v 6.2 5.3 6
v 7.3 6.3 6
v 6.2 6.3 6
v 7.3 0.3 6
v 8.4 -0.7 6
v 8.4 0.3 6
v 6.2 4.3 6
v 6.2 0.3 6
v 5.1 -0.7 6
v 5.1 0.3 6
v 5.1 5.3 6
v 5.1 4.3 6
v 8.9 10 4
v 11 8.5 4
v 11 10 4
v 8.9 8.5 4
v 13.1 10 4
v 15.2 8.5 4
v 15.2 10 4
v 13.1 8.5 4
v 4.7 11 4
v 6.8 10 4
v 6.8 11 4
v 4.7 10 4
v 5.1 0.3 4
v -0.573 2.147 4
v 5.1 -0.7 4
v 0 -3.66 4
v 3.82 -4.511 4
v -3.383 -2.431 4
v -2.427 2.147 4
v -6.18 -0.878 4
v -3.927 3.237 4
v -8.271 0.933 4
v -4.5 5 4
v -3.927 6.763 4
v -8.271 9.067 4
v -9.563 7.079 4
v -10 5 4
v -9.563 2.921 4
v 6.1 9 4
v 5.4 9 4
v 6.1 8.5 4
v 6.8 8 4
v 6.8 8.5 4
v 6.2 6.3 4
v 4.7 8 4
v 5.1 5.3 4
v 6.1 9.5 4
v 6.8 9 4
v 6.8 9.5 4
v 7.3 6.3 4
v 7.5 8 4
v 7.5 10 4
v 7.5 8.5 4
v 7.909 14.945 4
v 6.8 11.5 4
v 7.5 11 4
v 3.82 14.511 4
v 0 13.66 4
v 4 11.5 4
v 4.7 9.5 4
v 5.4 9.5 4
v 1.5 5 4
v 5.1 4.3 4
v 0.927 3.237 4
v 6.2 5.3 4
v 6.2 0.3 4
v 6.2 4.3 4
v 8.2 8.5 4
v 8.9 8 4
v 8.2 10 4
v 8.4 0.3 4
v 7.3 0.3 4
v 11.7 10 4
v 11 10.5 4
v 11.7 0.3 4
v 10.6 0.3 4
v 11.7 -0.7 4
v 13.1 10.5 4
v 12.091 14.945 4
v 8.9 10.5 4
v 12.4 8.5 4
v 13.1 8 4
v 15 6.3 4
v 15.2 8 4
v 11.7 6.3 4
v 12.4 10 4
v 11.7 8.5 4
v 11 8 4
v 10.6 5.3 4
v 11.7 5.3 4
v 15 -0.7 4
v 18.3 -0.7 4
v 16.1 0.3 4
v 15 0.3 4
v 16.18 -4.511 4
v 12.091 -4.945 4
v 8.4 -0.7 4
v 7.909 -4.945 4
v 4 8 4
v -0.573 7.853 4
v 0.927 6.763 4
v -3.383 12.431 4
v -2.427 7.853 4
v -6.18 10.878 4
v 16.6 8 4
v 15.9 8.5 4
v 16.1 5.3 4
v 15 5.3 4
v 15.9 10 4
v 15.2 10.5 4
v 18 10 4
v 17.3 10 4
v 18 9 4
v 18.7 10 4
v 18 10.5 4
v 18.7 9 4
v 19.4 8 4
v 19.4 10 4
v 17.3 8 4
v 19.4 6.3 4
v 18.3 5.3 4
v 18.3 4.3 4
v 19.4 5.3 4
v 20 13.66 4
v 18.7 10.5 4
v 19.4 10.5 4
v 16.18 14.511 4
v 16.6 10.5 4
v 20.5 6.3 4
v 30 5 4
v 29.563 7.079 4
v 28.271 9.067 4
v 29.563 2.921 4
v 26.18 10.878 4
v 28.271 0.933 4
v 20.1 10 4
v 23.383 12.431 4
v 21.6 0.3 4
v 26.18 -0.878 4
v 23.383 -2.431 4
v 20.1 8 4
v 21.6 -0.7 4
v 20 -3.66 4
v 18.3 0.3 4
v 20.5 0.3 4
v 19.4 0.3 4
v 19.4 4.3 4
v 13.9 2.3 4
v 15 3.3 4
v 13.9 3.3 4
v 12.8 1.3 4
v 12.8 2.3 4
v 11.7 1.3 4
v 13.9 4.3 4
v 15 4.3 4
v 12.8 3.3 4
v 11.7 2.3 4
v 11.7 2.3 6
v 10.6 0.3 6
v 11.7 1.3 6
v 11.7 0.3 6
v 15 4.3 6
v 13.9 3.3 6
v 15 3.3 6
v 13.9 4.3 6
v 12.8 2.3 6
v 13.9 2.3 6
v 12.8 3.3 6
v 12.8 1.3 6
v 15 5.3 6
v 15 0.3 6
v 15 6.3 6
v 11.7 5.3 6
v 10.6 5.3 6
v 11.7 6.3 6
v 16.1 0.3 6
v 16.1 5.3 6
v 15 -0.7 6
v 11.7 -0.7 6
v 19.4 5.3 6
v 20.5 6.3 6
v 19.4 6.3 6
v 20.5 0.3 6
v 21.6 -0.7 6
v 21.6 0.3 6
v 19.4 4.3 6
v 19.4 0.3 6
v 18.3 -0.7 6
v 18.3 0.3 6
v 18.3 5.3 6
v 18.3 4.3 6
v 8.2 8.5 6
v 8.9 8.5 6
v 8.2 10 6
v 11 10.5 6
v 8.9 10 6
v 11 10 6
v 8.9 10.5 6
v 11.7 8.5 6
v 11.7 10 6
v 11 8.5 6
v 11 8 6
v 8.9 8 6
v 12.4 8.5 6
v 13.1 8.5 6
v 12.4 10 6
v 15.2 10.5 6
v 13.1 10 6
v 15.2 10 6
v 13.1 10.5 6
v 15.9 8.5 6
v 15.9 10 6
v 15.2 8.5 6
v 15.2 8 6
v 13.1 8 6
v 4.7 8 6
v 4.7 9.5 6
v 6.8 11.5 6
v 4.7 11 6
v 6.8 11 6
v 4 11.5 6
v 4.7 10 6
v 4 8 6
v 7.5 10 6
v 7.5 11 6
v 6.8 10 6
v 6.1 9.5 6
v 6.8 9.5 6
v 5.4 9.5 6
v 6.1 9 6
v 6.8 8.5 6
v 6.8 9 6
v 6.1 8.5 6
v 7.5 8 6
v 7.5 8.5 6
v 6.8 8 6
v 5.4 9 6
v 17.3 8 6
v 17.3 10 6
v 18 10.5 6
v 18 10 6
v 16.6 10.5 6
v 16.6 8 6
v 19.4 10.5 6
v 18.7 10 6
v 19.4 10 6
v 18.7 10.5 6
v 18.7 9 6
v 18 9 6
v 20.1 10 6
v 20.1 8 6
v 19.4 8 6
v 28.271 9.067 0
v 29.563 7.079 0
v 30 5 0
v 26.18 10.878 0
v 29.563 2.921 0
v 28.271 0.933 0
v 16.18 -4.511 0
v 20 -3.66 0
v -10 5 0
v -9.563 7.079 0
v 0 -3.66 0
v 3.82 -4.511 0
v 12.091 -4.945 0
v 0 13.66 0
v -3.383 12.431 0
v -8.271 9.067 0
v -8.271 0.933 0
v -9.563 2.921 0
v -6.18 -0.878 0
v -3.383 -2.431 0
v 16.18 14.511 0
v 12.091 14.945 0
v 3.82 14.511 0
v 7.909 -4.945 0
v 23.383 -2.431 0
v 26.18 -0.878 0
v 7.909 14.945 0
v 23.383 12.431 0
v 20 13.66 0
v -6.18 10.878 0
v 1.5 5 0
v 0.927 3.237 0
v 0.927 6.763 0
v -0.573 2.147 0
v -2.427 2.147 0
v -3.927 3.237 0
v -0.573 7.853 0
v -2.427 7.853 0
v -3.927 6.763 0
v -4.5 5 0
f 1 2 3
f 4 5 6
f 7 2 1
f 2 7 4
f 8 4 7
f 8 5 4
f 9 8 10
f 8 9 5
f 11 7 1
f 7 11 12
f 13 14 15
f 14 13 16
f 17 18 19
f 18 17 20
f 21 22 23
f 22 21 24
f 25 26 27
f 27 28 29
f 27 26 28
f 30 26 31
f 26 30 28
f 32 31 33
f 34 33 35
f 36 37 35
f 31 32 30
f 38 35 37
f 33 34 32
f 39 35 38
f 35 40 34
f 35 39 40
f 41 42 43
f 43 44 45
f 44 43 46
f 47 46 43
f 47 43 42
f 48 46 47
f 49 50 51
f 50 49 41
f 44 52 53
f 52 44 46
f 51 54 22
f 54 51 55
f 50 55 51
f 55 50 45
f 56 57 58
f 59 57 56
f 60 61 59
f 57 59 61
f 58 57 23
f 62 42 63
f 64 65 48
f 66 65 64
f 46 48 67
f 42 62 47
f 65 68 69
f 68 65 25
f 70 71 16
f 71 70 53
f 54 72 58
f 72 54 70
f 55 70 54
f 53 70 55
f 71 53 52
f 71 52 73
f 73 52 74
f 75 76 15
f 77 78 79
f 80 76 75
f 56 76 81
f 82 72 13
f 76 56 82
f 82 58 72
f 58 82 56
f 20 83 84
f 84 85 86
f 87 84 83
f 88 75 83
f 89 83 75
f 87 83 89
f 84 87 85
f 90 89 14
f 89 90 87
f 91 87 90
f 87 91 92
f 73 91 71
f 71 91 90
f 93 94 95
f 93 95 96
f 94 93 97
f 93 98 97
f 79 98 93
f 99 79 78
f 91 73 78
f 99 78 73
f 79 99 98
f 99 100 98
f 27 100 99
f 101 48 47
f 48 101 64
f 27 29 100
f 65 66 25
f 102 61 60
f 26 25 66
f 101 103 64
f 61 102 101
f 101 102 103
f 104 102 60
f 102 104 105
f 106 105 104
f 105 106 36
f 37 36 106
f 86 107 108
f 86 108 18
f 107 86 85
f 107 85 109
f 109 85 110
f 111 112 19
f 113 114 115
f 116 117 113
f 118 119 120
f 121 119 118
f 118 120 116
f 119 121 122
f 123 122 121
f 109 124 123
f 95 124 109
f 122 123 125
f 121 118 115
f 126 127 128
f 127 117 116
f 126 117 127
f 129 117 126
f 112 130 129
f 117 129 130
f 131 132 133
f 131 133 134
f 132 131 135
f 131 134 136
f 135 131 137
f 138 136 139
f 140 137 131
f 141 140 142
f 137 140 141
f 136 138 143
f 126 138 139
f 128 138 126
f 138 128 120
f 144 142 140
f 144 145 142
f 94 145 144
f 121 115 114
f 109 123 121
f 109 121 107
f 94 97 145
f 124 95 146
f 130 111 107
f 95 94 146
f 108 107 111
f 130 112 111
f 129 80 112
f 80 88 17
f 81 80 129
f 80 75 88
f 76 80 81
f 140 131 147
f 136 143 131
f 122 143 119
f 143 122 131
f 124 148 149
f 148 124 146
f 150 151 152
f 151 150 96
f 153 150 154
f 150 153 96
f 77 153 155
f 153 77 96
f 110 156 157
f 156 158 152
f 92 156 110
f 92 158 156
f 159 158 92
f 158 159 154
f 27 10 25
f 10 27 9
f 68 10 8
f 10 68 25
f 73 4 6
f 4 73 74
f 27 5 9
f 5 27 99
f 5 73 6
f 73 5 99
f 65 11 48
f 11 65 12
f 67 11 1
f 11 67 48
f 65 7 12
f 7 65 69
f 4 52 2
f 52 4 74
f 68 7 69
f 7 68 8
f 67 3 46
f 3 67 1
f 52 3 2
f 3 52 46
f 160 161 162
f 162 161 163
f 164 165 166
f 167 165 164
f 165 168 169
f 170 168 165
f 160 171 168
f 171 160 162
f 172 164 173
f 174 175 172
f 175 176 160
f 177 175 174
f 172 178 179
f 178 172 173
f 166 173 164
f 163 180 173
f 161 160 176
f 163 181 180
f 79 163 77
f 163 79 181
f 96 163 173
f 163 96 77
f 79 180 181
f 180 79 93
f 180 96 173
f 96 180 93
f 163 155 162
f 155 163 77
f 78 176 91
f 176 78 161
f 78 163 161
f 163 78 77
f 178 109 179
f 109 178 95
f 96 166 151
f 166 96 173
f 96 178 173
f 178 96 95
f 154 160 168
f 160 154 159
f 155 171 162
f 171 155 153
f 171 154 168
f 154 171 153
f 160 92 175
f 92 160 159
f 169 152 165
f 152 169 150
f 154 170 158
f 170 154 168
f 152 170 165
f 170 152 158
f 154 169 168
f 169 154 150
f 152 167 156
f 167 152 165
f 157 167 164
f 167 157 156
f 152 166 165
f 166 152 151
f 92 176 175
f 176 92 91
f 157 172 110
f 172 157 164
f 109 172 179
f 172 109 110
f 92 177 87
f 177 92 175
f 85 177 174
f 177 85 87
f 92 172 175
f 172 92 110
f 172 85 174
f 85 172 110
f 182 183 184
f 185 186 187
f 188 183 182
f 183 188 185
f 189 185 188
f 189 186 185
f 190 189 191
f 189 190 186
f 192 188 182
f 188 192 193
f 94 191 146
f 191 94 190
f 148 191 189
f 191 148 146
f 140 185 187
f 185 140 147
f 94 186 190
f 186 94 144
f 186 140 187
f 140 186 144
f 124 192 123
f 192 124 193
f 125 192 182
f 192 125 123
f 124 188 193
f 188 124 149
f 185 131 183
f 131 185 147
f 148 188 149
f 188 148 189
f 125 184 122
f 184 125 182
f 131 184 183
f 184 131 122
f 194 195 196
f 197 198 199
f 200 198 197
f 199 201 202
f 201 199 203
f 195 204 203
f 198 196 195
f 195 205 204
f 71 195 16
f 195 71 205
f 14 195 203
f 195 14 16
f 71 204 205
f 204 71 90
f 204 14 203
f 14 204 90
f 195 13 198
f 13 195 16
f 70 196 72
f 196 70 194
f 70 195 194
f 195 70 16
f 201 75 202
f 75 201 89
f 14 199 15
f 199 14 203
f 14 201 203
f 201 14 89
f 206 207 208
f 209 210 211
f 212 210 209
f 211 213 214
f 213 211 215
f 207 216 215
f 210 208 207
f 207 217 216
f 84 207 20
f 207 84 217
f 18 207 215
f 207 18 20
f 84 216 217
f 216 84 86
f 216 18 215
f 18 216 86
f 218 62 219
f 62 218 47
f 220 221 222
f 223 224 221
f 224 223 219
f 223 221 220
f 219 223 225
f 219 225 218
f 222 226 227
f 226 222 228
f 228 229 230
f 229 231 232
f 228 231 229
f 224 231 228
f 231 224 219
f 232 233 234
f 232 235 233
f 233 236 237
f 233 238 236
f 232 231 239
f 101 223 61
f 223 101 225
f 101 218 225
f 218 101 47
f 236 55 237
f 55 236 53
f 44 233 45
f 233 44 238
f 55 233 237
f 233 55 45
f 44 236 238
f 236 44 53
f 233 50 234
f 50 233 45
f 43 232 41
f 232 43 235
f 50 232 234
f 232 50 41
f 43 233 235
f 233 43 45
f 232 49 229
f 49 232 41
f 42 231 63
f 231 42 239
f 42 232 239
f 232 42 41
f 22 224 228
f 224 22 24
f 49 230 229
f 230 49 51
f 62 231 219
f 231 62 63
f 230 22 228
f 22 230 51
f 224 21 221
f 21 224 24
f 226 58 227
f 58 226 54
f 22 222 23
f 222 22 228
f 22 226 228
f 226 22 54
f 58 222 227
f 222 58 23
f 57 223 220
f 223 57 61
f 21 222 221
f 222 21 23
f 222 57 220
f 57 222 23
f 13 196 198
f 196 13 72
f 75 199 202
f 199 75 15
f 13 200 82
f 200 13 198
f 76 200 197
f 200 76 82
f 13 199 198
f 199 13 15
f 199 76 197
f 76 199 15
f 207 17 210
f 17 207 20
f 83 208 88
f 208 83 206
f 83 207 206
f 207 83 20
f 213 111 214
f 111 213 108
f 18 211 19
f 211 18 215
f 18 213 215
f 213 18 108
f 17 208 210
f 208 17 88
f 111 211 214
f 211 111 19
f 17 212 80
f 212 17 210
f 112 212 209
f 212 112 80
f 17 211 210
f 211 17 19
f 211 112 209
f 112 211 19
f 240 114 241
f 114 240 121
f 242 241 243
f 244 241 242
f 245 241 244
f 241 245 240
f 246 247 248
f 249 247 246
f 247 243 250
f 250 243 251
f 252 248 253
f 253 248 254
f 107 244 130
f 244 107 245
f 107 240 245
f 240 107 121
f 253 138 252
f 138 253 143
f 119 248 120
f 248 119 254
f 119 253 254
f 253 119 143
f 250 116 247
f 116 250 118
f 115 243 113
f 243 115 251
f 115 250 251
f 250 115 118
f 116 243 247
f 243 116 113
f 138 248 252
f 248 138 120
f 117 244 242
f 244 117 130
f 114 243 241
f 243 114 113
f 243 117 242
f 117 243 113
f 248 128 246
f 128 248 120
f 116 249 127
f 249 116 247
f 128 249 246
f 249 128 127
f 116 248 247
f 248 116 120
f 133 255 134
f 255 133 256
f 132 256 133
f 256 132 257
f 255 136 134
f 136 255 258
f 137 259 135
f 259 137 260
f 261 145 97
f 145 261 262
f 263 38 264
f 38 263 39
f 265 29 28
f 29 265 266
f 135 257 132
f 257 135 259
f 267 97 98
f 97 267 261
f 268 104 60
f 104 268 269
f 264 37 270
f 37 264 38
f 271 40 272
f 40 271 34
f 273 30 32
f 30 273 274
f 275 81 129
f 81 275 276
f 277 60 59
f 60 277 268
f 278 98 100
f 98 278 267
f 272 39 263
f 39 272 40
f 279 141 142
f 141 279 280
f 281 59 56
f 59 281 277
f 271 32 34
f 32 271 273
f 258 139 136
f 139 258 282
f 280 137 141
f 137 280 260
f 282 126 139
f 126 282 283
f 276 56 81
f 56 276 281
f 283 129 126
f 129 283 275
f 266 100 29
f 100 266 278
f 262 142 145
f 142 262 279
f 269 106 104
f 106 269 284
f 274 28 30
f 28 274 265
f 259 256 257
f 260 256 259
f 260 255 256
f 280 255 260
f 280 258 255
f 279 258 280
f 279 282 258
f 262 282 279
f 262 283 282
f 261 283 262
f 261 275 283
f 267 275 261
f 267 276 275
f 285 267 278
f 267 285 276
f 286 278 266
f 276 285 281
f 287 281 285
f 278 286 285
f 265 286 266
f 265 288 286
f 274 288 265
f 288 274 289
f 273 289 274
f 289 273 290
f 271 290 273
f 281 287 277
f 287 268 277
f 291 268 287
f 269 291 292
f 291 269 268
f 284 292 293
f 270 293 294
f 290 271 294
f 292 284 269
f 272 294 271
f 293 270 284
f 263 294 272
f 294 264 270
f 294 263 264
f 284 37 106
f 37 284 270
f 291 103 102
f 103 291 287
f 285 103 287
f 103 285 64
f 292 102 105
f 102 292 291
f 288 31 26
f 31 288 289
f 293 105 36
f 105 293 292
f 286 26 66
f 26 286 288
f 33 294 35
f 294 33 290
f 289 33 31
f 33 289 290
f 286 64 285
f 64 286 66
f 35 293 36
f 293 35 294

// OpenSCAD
//#
//#  thing1379622_roomnumber-keychain-customizable.scad
//#  http://www.thingiverse.com/thing:1379622
//#
//#  2016-02-29  V0.1 prototype
//#  2016-02-29  V0.2 dynamic scale, inner font

//###  parameter  ###

room_text = "Room";
room_number = "101";
keychain_height = 6; // [2:3:18]
keychain_size = 1.0; // [0.5:Small,1.0:Medium,1.5:Large]
font_style = "outer"; // [outer,inner]

//###  parts  ###

scale(keychain_size) print_part();

module print_part() {
  text_scale = 4/len(room_text);
  number_scale = 3/len(room_number);
  if (font_style == "inner") {
      difference() {
          scale([2,1,1]) 
            translate([10/2,10/2,0])
            cylinder(keychain_height,10,10);
          union () {
              color("red") 
                translate([4.0,-0.7,keychain_height/3*2])
                scale([1.1*number_scale,1.0,keychain_height/3*1]) 
                lib_drawtext(room_number);
              color("red") 
                translate([4.0,8,keychain_height/3*2])
                scale([0.7*text_scale,0.5,keychain_height/3*1]) 
                lib_drawtext(room_text);
              color("green") 
                translate([-3/2,5,0])
                cylinder(keychain_height,3,3);
          }
      }
  } else {
      difference() {
          union () {
              scale([2,1,1]) 
                translate([10/2,10/2,0])
                cylinder(keychain_height/3*2,10,10);
              color("red") 
                translate([4.0,-0.7,keychain_height/3*2])
                scale([1.1*number_scale,1.0,keychain_height/3*1]) 
                lib_drawtext(room_number);
              color("red") 
                translate([4.0,8,keychain_height/3*2])
                scale([0.7*text_scale,0.5,keychain_height/3*1]) 
                lib_drawtext(room_text);
          }  
          color("green") 
            translate([-3/2,5,0])
            cylinder(keychain_height/3*2,3,3);
      }
  }
}

//###  libraries  ###

module lib_drawtext(text) {

  // 
  //  OpenSCAD 3D Text Generator
  //  http://www.thingiverse.com/thing:59817
  // 
  //  Copyright (c) by pgreenland, published  Mar 10, 2013
  //  Licensed under the Creative Commons - Attribution - Share Alike license. 
  // 

  //Characters
  chars = " !\"#$%&'()*+,-./0123456789:;<=>?@ABCDEFGHIJKLMNOPQRSTUVWXYZ[\\]^_`abcdefghijklmnopqrstuvwxyz{|}";

  //Chracter table defining 5x7 characters
  //Adapted from: http://www.geocities.com/dinceraydin/djlcdsim/chartable.js
  char_table = [ [ 0, 0, 0, 0, 0, 0, 0],
                 [ 4, 0, 4, 4, 4, 4, 4],
                 [ 0, 0, 0, 0,10,10,10],
                 [10,10,31,10,31,10,10],
                 [ 4,30, 5,14,20,15, 4],
                 [ 3,19, 8, 4, 2,25,24],
                 [13,18,21, 8,20,18,12],
                 [ 0, 0, 0, 0, 8, 4,12],
                 [ 2, 4, 8, 8, 8, 4, 2],
                 [ 8, 4, 2, 2, 2, 4, 8],
                 [ 0, 4,21,14,21, 4, 0],
                 [ 0, 4, 4,31, 4, 4, 0],
                 [ 8, 4,12, 0, 0, 0, 0],
                 [ 0, 0, 0,31, 0, 0, 0],
                 [12,12, 0, 0, 0, 0, 0],
                 [ 0,16, 8, 4, 2, 1, 0],
                 [14,17,25,21,19,17,14],
                 [14, 4, 4, 4, 4,12, 4],
                 [31, 8, 4, 2, 1,17,14],
                 [14,17, 1, 2, 4, 2,31],
                 [ 2, 2,31,18,10, 6, 2],
                 [14,17, 1, 1,30,16,31],
                 [14,17,17,30,16, 8, 6],
                 [ 8, 8, 8, 4, 2, 1,31],
                 [14,17,17,14,17,17,14],
                 [12, 2, 1,15,17,17,14],
                 [ 0,12,12, 0,12,12, 0],
                 [ 8, 4,12, 0,12,12, 0],
                 [ 2, 4, 8,16, 8, 4, 2],
                 [ 0, 0,31, 0,31, 0, 0],
                 [16, 8, 4, 2, 4, 8,16],
                 [ 4, 0, 4, 2, 1,17,14],
                 [14,21,21,13, 1,17,14],
                 [17,17,31,17,17,17,14],
                 [30,17,17,30,17,17,30],
                 [14,17,16,16,16,17,14],
                 [30,17,17,17,17,17,30],
                 [31,16,16,30,16,16,31],
                 [16,16,16,30,16,16,31],
                 [15,17,17,23,16,17,14],
                 [17,17,17,31,17,17,17],
                 [14, 4, 4, 4, 4, 4,14],
                 [12,18, 2, 2, 2, 2, 7],
                 [17,18,20,24,20,18,17],
                 [31,16,16,16,16,16,16],
                 [17,17,17,21,21,27,17],
                 [17,17,19,21,25,17,17],
                 [14,17,17,17,17,17,14],
                 [16,16,16,30,17,17,30],
                 [13,18,21,17,17,17,14],
                 [17,18,20,30,17,17,30],
                 [30, 1, 1,14,16,16,15],
                 [ 4, 4, 4, 4, 4, 4,31],
                 [14,17,17,17,17,17,17],
                 [ 4,10,17,17,17,17,17],
                 [10,21,21,21,17,17,17],
                 [17,17,10, 4,10,17,17],
                 [ 4, 4, 4,10,17,17,17],
                 [31,16, 8, 4, 2, 1,31],
                 [14, 8, 8, 8, 8, 8,14],
                 [ 0, 1, 2, 4, 8,16, 0],
                 [14, 2, 2, 2, 2, 2,14],
                 [ 0, 0, 0, 0,17,10, 4],
                 [31, 0, 0, 0, 0, 0, 0],
                 [ 0, 0, 0, 0, 2, 4, 8],
                 [15,17,15, 1,14, 0, 0],
                 [30,17,17,25,22,16,16],
                 [14,17,16,16,14, 0, 0],
                 [15,17,17,19,13, 1, 1],
                 [14,16,31,17,14, 0, 0],
                 [ 8, 8, 8,28, 8, 9, 6],
                 [14, 1,15,17,15, 0, 0],
                 [17,17,17,25,22,16,16],
                 [14, 4, 4, 4,12, 0, 4],
                 [12,18, 2, 2, 2, 6, 2],
                 [18,20,24,20,18,16,16],
                 [14, 4, 4, 4, 4, 4,12],
                 [17,17,21,21,26, 0, 0],
                 [17,17,17,25,22, 0, 0],
                 [14,17,17,17,14, 0, 0],
                 [16,16,30,17,30, 0, 0],
                 [ 1, 1,15,19,13, 0, 0],
                 [16,16,16,25,22, 0, 0],
                 [30, 1,14,16,15, 0, 0],
                 [ 6, 9, 8, 8,28, 8, 8],
                 [13,19,17,17,17, 0, 0],
                 [ 4,10,17,17,17, 0, 0],
                 [10,21,21,17,17, 0, 0],
                 [17,10, 4,10,17, 0, 0],
                 [14, 1,15,17,17, 0, 0],
                 [31, 8, 4, 2,31, 0, 0],
                 [ 2, 4, 4, 8, 4, 4, 2],
                 [ 4, 4, 4, 4, 4, 4, 4],
                 [ 8, 4, 4, 2, 4, 4, 8] ];

  //Binary decode table
  dec_table = [ "00000", "00001", "00010", "00011", "00100", "00101",
                "00110", "00111", "01000", "01001", "01010", "01011",
                "01100", "01101", "01110", "01111", "10000", "10001",
                "10010", "10011", "10100", "10101", "10110", "10111",
                "11000", "11001", "11010", "11011", "11100", "11101",
                "11110", "11111" ];

  //Process string one character at a time
  for(itext = [0:len(text)-1]) {
    //Convert character to index
    ichar = search(text[itext],chars,1)[0];

    //Decode character - rows
    for(irow = [0:6]) {
      //Select value to draw from table
      val = dec_table[char_table[ichar][irow]];

      //Decode character - cols
      for(icol = [0:4]) {
        // Retrieve bit to draw
        bit = search(val[icol],"01",1)[0];

        if(bit) {
            //Output cube
            translate([icol + (6*itext), irow, 0])
                cube([1.0001,1.0001,1]);
        }
      }
    }
  }
}
